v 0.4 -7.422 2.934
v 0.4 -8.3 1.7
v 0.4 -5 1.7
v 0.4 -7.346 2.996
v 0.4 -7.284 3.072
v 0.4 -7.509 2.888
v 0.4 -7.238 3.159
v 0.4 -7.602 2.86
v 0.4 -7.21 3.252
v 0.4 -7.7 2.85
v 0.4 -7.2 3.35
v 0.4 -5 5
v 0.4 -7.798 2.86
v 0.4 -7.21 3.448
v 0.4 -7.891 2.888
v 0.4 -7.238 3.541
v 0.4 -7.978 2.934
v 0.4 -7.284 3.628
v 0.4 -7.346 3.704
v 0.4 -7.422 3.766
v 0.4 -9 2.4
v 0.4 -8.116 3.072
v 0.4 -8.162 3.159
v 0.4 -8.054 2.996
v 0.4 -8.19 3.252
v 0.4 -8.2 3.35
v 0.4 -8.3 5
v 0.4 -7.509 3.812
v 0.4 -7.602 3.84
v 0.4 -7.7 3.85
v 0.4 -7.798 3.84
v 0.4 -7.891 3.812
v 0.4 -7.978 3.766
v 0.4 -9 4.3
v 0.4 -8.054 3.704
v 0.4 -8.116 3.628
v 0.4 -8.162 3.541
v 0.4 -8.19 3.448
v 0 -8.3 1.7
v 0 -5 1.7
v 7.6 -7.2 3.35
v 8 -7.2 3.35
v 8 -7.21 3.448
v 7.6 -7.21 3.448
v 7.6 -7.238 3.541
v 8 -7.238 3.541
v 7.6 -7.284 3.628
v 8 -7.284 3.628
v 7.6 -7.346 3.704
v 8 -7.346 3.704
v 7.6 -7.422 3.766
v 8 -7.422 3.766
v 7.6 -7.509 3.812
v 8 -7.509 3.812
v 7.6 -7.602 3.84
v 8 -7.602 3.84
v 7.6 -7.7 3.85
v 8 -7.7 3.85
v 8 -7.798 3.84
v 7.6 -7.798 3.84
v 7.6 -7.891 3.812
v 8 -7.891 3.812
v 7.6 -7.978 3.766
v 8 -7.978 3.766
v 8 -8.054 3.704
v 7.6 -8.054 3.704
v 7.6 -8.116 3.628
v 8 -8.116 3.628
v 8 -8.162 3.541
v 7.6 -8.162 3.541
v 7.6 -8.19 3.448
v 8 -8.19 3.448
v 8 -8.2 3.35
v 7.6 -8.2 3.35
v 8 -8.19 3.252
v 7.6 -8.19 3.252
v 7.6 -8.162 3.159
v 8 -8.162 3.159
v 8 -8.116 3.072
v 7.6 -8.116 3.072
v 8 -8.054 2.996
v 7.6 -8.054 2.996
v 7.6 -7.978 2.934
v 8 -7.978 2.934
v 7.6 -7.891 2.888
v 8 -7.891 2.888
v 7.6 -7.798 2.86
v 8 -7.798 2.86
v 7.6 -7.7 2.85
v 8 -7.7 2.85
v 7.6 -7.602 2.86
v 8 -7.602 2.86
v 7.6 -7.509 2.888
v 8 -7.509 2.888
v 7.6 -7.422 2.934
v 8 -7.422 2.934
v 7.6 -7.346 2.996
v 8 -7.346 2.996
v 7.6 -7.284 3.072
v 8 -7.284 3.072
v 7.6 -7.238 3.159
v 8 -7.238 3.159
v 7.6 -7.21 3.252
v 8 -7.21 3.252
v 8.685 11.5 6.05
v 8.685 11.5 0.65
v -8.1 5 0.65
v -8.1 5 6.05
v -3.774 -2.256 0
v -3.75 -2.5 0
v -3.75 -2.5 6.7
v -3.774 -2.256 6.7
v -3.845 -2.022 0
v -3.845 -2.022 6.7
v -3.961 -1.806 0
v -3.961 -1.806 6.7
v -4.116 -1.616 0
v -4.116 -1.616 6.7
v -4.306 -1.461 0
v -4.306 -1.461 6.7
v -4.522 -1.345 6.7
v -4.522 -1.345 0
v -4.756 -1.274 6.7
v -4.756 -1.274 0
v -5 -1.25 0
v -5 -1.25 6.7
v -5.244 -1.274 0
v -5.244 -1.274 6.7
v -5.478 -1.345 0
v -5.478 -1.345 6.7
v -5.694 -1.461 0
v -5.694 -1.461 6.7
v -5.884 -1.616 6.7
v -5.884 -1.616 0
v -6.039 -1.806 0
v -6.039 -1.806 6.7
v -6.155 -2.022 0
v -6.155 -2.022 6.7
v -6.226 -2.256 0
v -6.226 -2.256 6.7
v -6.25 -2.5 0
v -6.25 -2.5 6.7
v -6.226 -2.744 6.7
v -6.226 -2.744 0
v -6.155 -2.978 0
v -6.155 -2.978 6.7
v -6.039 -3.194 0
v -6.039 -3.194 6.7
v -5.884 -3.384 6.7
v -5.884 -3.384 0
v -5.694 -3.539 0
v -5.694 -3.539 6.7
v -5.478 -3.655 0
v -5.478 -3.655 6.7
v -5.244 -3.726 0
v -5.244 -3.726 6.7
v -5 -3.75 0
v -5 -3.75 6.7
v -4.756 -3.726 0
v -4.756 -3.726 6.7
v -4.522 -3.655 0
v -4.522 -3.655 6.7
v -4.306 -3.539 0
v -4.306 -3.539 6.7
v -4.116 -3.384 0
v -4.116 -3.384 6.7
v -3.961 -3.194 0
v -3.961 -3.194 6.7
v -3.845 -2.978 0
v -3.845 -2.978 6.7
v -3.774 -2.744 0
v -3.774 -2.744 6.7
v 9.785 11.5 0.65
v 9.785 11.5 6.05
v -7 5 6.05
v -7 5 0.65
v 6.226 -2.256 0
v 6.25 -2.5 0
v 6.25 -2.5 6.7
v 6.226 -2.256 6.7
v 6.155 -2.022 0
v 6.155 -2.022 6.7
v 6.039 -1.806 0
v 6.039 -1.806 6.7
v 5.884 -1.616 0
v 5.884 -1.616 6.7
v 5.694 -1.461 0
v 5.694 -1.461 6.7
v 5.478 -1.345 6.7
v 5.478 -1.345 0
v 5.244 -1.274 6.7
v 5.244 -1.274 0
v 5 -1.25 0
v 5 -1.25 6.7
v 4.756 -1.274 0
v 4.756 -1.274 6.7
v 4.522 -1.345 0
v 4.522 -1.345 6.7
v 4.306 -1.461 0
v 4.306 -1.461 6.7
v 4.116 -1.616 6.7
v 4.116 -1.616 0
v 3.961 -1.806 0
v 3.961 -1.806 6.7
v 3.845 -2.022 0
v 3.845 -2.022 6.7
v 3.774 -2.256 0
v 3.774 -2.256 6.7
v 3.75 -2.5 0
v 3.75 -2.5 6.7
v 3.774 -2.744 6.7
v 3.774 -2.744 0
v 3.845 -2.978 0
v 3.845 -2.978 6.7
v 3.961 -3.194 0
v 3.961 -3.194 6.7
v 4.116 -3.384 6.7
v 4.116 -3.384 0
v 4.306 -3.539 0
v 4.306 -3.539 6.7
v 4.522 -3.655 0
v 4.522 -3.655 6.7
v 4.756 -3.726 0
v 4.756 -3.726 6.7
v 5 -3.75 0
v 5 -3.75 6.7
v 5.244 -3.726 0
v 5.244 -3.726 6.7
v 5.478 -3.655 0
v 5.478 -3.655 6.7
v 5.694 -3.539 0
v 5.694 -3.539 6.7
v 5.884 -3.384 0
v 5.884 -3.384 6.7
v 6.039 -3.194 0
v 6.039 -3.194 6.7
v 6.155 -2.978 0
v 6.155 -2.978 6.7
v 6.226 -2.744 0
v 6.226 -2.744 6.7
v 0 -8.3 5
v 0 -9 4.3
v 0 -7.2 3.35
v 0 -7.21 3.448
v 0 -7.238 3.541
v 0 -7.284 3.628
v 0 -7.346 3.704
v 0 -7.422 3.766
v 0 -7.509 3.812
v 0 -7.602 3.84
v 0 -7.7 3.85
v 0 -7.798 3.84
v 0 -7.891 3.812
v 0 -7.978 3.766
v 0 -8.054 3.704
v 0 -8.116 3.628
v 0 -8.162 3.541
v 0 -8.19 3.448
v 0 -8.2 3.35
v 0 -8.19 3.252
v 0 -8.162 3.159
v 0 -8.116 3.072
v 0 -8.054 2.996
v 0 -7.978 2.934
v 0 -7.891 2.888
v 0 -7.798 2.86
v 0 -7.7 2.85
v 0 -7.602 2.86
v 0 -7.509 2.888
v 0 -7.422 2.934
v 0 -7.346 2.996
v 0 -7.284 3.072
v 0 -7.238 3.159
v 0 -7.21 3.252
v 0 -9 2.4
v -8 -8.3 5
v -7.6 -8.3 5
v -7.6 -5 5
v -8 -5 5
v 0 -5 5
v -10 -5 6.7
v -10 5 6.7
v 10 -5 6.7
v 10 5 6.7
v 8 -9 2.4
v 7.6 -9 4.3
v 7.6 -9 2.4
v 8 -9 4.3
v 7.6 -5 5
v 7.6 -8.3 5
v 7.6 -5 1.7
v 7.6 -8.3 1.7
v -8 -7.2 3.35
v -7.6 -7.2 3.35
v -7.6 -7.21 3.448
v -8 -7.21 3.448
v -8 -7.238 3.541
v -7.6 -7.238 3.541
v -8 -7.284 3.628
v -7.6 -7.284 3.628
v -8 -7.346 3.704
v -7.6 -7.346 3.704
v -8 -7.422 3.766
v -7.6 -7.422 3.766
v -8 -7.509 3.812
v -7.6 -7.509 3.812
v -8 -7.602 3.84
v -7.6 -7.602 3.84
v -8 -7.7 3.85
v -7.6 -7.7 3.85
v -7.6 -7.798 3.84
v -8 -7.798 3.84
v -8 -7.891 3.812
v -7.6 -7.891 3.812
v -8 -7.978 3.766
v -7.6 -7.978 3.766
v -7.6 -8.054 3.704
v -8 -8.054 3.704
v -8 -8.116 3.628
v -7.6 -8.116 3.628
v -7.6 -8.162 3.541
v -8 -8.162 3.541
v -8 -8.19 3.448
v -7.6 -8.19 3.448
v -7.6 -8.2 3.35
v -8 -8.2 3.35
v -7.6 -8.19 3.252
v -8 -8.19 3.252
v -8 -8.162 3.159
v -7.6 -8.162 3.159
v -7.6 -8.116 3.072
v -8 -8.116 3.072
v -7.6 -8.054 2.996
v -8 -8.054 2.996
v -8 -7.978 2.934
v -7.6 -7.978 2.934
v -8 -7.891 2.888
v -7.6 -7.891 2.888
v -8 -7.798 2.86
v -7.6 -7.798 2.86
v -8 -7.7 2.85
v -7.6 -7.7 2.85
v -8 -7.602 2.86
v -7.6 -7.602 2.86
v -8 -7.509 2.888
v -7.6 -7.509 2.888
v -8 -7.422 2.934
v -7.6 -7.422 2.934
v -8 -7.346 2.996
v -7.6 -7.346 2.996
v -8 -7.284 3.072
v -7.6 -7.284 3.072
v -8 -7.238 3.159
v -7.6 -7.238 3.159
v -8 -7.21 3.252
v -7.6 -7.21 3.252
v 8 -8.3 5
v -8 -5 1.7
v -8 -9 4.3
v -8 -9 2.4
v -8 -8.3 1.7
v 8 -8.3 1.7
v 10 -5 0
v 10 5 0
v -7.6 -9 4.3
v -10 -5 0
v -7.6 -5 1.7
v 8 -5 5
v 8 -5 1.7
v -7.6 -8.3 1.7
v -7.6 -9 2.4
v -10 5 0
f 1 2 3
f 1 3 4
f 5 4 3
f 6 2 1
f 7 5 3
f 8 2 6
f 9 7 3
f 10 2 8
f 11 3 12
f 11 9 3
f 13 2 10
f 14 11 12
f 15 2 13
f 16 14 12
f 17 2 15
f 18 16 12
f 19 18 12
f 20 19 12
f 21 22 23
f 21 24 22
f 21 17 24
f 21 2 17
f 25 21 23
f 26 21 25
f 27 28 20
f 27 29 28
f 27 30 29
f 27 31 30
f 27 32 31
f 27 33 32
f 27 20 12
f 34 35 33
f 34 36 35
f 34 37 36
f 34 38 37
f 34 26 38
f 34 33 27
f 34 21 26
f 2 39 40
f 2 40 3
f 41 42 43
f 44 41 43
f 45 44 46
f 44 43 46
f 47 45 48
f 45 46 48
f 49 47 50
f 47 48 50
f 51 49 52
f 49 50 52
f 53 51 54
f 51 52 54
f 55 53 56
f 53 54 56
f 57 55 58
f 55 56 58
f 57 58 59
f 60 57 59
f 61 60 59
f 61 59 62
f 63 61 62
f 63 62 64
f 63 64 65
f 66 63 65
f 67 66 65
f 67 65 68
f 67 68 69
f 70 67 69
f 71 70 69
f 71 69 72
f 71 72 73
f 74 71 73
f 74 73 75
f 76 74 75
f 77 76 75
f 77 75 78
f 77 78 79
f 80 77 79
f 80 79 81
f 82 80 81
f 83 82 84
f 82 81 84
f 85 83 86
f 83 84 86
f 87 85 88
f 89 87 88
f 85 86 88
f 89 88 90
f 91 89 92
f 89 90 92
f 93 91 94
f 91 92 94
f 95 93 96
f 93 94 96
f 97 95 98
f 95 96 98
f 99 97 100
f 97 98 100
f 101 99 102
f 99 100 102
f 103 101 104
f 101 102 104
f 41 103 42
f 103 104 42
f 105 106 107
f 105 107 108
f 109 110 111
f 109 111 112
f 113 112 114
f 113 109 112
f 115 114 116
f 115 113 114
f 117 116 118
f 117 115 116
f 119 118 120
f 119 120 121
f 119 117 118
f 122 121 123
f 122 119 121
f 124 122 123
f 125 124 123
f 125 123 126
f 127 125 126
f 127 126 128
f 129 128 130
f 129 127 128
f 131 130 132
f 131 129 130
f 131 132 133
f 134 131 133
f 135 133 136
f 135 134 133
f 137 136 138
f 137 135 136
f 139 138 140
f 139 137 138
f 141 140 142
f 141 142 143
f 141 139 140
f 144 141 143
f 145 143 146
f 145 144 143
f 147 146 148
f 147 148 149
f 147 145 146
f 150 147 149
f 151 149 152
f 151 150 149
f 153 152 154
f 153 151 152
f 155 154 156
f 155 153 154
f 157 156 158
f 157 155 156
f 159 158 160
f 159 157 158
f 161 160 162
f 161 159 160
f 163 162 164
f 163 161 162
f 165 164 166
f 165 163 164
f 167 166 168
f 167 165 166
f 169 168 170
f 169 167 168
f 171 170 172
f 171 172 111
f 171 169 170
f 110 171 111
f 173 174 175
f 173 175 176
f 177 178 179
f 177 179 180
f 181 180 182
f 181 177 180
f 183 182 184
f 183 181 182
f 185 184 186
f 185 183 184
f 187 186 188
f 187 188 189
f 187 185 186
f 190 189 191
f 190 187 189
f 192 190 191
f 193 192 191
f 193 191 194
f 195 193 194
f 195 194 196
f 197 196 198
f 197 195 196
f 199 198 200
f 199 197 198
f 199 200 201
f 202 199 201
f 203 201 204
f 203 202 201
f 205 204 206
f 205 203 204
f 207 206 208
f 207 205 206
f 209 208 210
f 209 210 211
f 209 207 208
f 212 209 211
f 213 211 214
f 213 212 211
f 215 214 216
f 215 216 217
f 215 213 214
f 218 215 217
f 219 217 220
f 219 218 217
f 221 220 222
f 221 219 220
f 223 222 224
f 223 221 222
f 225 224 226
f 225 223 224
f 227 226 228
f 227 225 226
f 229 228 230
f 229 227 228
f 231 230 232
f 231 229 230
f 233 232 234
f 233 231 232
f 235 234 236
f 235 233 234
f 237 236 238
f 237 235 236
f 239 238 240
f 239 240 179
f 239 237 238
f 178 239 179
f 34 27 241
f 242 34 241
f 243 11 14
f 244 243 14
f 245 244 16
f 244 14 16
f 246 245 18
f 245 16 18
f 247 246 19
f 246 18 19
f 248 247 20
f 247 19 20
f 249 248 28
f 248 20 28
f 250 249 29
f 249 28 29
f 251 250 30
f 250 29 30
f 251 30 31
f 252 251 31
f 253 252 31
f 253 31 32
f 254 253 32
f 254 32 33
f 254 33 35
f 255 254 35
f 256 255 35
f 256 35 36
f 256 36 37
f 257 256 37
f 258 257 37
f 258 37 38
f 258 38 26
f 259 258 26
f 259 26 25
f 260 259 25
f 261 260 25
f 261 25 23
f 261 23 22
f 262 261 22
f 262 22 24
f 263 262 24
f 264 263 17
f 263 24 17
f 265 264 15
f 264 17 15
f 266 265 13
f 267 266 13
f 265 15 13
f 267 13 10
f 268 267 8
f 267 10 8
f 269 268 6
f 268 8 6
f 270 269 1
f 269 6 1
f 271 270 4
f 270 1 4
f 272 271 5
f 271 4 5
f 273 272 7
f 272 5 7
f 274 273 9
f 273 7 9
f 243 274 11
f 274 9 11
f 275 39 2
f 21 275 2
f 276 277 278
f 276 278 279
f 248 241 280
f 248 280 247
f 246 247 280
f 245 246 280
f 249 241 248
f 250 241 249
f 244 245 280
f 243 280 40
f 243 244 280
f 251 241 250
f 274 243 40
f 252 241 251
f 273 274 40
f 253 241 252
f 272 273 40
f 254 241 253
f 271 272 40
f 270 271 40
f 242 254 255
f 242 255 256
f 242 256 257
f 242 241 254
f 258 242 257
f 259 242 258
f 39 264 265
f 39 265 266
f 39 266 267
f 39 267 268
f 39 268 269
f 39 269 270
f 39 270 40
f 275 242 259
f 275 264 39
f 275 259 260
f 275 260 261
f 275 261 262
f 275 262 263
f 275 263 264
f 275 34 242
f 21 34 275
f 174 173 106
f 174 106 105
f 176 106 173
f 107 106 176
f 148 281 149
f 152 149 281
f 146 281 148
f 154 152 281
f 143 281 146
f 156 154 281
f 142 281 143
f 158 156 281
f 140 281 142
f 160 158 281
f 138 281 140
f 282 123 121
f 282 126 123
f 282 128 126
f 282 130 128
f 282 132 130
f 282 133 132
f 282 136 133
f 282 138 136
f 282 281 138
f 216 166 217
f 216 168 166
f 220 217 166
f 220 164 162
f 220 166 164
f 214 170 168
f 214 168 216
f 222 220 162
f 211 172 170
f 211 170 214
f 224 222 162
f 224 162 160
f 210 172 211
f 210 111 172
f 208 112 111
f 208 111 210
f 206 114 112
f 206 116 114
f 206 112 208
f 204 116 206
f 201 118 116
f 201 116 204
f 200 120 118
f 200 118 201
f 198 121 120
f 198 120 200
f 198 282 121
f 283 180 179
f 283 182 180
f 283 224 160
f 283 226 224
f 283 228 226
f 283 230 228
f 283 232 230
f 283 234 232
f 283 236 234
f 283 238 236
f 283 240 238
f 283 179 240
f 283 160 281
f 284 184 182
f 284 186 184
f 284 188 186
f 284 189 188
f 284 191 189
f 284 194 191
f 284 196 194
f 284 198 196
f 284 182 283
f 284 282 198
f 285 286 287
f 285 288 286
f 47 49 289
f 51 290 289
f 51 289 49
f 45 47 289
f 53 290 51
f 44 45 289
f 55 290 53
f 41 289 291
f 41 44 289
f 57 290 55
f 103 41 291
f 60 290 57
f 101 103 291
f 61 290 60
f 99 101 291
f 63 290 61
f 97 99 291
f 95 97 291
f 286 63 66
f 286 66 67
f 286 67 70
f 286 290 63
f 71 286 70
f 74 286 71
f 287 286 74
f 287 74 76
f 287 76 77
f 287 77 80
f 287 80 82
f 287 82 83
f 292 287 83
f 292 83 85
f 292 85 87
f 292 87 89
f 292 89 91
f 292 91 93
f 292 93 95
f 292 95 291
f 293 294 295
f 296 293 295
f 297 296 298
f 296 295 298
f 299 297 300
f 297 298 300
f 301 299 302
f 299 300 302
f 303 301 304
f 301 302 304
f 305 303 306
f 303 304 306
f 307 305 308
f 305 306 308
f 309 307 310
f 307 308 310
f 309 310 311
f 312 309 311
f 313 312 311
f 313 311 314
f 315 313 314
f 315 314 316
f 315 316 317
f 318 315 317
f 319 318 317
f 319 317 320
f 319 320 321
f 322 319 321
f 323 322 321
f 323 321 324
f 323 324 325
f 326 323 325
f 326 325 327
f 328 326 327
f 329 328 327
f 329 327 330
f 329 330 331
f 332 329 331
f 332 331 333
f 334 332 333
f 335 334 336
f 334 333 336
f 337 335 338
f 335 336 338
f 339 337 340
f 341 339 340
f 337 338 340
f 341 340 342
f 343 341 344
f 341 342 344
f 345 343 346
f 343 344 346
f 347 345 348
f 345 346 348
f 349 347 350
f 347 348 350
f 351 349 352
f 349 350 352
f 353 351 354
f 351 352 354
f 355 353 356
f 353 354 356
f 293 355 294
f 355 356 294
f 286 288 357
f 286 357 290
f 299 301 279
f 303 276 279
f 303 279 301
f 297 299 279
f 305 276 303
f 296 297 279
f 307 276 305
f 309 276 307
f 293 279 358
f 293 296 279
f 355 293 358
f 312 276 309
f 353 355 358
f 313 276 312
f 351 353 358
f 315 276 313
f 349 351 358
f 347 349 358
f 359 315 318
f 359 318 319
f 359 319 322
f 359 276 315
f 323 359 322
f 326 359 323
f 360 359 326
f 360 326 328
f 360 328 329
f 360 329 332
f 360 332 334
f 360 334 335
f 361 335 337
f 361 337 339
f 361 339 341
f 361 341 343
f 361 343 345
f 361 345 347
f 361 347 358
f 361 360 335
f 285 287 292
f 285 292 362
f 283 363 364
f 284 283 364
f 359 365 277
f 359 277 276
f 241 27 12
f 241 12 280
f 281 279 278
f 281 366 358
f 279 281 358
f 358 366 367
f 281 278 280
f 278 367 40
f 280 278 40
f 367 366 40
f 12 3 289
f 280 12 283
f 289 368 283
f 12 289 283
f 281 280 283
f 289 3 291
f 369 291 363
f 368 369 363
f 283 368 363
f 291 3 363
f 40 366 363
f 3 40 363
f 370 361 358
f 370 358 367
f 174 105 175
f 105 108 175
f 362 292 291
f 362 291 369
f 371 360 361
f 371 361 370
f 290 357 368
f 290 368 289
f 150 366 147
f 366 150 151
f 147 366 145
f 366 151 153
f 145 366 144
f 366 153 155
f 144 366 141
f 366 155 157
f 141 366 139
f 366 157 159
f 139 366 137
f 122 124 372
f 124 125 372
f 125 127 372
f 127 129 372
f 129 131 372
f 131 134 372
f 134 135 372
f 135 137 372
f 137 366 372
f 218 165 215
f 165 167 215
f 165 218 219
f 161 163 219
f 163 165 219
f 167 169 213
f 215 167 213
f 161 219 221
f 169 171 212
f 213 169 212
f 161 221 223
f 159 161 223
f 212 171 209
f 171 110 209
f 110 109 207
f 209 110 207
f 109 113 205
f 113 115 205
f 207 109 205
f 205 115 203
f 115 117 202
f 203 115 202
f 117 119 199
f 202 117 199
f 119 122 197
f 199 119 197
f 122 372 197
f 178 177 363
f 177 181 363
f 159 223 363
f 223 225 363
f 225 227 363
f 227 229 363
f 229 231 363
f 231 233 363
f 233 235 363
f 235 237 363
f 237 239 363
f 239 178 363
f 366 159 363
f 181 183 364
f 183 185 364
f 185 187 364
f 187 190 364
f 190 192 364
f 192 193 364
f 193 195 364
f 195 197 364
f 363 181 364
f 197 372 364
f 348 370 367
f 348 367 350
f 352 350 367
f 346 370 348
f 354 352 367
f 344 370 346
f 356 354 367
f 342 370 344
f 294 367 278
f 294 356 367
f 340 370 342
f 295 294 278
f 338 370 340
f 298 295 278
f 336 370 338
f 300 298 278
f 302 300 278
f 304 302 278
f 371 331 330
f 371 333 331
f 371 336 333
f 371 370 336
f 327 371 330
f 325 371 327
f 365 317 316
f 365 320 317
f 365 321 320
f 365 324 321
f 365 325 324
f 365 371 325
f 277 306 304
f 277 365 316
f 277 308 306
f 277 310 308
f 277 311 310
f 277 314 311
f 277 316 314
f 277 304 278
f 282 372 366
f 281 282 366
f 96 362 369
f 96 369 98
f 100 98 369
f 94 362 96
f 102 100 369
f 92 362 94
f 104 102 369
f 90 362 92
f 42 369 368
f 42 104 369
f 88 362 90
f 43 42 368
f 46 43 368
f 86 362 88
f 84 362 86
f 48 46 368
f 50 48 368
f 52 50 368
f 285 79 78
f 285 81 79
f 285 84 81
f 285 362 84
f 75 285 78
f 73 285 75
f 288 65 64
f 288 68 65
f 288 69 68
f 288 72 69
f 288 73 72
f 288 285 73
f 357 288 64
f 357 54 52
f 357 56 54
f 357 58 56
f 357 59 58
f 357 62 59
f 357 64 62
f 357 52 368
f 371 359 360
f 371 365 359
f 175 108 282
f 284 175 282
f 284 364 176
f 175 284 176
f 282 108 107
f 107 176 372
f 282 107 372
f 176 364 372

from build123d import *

# Parameters (mm, degrees)
F0_R     = 1.25
F1_DEPTH = 6.7
F2_W     = 0.4
F2_H     = 3.3
F3_W     = 1.1
F3_H     = 5.4
F6_R     = 0.5
F7_DEPTH = 25
F8_SIZE  = 0.7


with BuildPart() as f1:
    # F0 (on Top) → F1 (new body)
    with BuildSketch(Plane.XY):
        Polygon((-7, 5), (-10, 5), (-10, -5), (-8, -5), (0, -5), (8, -5), (10, -5), (10, 5), align=None)
        with Locations((-5, -2.5)):
            Circle(F0_R, mode=Mode.SUBTRACT)
        with Locations((5, -2.5)):
            Circle(F0_R, mode=Mode.SUBTRACT)
    extrude(amount=F1_DEPTH)

    # F4: sweep along a path in F0
    with BuildLine(Plane.XY) as f4_path:
        Line((-8, -5), (-8, -9))
    # F2 (on face) → F4 (sweep)
    with BuildSketch(Plane.XZ.offset(5)):
        with Locations((-7.8, 3.35)):
            Rectangle(F2_W, F2_H)
        with Locations((0.2, 3.35)):
            Rectangle(F2_W, F2_H)
        with Locations((7.8, 3.35)):
            Rectangle(F2_W, F2_H)
    sweep(path=f4_path.line)

    # F5: sweep along a path in F0
    with BuildLine(Plane.XY) as f5_path:
        Line((-7, 5), (9.7854103316, 11.5))
    # F3 (on face) → F5 (sweep)
    with BuildSketch(Plane(origin=(0, 5, 0), x_dir=(-1, 0, 0), z_dir=(0, 1, 0))):
        with Locations((7.55, 3.35)):
            Rectangle(F3_W, F3_H)
    sweep(path=f5_path.line)

    # F6 (on face) → F7 (cut)
    with BuildSketch(Plane.YZ.offset(8)):
        with Locations((-7.7, 3.35)):
            Circle(F6_R)
    extrude(amount=-F7_DEPTH, mode=Mode.SUBTRACT)

    # F8
    f8_edges = [f1.edges().sort_by_distance(p)[0] for p in [
        (-7.8, -9, 5),
        (0.2, -9, 5),
        (7.8, -9, 5),
        (-7.8, -9, 1.7),
        (0.2, -9, 1.7),
        (7.8, -9, 1.7),
    ]]
    chamfer(f8_edges, length=F8_SIZE)


solid = f1.part
